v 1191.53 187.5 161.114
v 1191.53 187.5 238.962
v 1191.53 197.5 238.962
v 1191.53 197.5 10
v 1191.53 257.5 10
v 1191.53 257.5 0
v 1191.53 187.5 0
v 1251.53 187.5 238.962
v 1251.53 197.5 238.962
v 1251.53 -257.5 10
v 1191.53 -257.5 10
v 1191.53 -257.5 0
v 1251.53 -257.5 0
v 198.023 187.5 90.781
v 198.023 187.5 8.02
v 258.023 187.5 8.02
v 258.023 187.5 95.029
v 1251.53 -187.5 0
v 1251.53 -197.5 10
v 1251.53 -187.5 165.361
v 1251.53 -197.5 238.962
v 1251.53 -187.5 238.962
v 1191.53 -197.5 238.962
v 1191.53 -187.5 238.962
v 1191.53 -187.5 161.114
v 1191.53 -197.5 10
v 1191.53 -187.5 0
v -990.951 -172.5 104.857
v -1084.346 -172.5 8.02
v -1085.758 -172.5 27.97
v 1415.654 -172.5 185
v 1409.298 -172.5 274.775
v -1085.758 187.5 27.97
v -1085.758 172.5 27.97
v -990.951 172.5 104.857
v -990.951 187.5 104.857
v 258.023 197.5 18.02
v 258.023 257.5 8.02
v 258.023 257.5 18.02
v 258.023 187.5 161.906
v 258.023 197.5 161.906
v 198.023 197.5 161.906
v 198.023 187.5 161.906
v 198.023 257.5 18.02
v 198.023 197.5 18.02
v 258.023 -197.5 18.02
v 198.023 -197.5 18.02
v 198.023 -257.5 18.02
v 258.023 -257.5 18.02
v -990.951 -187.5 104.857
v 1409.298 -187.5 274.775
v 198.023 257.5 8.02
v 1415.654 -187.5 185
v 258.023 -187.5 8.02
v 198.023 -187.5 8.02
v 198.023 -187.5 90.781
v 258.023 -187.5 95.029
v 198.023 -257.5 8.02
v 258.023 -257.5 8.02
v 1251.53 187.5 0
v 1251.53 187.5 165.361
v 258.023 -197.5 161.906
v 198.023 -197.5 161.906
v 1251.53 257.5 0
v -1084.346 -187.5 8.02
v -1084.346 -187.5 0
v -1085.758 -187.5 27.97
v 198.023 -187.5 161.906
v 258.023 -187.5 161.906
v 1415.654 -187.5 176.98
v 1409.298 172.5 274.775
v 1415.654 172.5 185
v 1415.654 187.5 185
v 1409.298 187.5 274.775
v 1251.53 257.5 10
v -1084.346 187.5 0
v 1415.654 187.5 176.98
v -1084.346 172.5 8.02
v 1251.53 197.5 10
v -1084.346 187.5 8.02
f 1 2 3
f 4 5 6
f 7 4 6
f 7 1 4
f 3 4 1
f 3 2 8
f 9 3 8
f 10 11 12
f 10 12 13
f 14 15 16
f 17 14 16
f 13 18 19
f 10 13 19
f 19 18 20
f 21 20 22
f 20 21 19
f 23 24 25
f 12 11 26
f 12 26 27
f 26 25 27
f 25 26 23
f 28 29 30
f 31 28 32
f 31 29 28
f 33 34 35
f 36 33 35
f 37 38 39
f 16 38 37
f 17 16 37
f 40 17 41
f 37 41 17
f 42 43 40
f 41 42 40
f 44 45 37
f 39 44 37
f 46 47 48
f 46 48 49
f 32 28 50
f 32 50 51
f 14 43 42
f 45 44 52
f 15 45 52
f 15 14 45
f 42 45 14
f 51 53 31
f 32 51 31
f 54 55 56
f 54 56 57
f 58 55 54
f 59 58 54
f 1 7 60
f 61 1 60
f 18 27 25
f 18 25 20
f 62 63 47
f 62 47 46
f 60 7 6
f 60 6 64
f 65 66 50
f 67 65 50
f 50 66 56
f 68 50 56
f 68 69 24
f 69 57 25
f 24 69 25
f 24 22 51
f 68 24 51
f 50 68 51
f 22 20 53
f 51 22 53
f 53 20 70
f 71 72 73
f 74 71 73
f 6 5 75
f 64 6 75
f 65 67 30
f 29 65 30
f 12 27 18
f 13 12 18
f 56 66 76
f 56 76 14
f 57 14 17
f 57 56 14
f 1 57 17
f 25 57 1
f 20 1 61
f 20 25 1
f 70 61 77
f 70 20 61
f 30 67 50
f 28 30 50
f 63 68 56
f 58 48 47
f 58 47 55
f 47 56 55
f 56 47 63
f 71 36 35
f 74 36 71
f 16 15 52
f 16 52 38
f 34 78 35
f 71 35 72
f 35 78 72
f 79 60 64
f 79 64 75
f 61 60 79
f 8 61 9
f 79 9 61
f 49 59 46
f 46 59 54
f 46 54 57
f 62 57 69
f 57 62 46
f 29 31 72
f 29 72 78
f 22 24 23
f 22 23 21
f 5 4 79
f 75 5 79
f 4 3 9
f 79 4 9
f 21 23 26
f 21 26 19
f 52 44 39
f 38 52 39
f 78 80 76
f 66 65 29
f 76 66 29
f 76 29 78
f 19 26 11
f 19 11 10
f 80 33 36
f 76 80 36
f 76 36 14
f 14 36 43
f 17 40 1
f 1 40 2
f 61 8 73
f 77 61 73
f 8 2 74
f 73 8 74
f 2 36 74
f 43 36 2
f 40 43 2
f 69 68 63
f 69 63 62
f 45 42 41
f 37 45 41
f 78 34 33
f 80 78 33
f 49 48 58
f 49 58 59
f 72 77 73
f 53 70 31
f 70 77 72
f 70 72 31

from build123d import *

# Parameters (mm, degrees)
F1_DEPTH = 187.5
F2_W     = 2506.2565537025
F2_H     = 15
F3_DEPTH = 90
F4_W     = 60
F4_H     = 10
F5_DEPTH = 70
F4_H_2   = 228.9615774155
F4_H_3   = 143.8855462986
F6_DEPTH = 10
F9_DEPTH = 375


with BuildPart() as f1:
    # F0 (on Front) → F1 (new body, symmetric)
    with BuildSketch(Plane.XZ):
        Polygon((-1084.3461751938, 8.0200209718), (-1084.3461751938, 0), (1415.6538248062, 176.9799790282), (1415.6538248062, 185), align=None)
    extrude(amount=F1_DEPTH, both=True)

    # F2 (on face) → F3 (join)
    with BuildSketch(Plane(origin=(-5.9720318293, 0, 84.3602742827), x_dir=(0.997503626, 0, 0.0706152683), z_dir=(-0.0706152683, 0, 0.997503626))):
        with Locations((172.0553711911, -180)):
            Rectangle(F2_W, F2_H)
        with Locations((172.0553711911, 180)):
            Rectangle(F2_W, F2_H)
    extrude(amount=F3_DEPTH)



with BuildPart() as f5:
    # F4 (on face) → F5 (new body)
    with BuildSketch(Plane.XZ.offset(187.5)):
        with Locations((228.0231494724, 13.0200209718)):
            Rectangle(F4_W, F4_H)
    extrude(amount=F5_DEPTH)


with BuildPart() as f5b:
    # F4 (on face) → F5, piece 2 (new body)
    with BuildSketch(Plane.XZ.offset(187.5)):
        with Locations((1221.529750824, 5)):
            Rectangle(F4_W, F4_H)
    extrude(amount=F5_DEPTH)


with BuildPart() as f1_1:
    add(f1.part)

    add(f5.part)  # F6 merges F5

    add(f5b.part)  # F6 merges F5b
    # F4 (on face) → F6 (join)
    with BuildSketch(Plane.XZ.offset(187.5)):
        with Locations((1221.529750824, 124.4807887077)):
            Rectangle(F4_W, F4_H_2)
        with Locations((1221.529750824, 5)):
            Rectangle(F4_W, F4_H)
        with Locations((228.0231494724, 89.9627941211)):
            Rectangle(F4_W, F4_H_3)
        with Locations((228.0231494724, 13.0200209718)):
            Rectangle(F4_W, F4_H)
    extrude(amount=F6_DEPTH)

    # F7: F1 across plane


with BuildPart() as f1_2:
    add(f1_1.part)
    add(f1_1.part.mirror(Plane.XZ))

    # F8 (on face) → F9 (cut, through all)
    with BuildSketch(Plane.XZ.offset(187.5)):
        Polygon((-1085.7584805603, 27.9700934918), (-990.9511867431, 104.8568741441), (-1090.7015493429, 97.7953473117), align=None)
    extrude(amount=-F9_DEPTH, mode=Mode.SUBTRACT)


solid = f1_2.part
